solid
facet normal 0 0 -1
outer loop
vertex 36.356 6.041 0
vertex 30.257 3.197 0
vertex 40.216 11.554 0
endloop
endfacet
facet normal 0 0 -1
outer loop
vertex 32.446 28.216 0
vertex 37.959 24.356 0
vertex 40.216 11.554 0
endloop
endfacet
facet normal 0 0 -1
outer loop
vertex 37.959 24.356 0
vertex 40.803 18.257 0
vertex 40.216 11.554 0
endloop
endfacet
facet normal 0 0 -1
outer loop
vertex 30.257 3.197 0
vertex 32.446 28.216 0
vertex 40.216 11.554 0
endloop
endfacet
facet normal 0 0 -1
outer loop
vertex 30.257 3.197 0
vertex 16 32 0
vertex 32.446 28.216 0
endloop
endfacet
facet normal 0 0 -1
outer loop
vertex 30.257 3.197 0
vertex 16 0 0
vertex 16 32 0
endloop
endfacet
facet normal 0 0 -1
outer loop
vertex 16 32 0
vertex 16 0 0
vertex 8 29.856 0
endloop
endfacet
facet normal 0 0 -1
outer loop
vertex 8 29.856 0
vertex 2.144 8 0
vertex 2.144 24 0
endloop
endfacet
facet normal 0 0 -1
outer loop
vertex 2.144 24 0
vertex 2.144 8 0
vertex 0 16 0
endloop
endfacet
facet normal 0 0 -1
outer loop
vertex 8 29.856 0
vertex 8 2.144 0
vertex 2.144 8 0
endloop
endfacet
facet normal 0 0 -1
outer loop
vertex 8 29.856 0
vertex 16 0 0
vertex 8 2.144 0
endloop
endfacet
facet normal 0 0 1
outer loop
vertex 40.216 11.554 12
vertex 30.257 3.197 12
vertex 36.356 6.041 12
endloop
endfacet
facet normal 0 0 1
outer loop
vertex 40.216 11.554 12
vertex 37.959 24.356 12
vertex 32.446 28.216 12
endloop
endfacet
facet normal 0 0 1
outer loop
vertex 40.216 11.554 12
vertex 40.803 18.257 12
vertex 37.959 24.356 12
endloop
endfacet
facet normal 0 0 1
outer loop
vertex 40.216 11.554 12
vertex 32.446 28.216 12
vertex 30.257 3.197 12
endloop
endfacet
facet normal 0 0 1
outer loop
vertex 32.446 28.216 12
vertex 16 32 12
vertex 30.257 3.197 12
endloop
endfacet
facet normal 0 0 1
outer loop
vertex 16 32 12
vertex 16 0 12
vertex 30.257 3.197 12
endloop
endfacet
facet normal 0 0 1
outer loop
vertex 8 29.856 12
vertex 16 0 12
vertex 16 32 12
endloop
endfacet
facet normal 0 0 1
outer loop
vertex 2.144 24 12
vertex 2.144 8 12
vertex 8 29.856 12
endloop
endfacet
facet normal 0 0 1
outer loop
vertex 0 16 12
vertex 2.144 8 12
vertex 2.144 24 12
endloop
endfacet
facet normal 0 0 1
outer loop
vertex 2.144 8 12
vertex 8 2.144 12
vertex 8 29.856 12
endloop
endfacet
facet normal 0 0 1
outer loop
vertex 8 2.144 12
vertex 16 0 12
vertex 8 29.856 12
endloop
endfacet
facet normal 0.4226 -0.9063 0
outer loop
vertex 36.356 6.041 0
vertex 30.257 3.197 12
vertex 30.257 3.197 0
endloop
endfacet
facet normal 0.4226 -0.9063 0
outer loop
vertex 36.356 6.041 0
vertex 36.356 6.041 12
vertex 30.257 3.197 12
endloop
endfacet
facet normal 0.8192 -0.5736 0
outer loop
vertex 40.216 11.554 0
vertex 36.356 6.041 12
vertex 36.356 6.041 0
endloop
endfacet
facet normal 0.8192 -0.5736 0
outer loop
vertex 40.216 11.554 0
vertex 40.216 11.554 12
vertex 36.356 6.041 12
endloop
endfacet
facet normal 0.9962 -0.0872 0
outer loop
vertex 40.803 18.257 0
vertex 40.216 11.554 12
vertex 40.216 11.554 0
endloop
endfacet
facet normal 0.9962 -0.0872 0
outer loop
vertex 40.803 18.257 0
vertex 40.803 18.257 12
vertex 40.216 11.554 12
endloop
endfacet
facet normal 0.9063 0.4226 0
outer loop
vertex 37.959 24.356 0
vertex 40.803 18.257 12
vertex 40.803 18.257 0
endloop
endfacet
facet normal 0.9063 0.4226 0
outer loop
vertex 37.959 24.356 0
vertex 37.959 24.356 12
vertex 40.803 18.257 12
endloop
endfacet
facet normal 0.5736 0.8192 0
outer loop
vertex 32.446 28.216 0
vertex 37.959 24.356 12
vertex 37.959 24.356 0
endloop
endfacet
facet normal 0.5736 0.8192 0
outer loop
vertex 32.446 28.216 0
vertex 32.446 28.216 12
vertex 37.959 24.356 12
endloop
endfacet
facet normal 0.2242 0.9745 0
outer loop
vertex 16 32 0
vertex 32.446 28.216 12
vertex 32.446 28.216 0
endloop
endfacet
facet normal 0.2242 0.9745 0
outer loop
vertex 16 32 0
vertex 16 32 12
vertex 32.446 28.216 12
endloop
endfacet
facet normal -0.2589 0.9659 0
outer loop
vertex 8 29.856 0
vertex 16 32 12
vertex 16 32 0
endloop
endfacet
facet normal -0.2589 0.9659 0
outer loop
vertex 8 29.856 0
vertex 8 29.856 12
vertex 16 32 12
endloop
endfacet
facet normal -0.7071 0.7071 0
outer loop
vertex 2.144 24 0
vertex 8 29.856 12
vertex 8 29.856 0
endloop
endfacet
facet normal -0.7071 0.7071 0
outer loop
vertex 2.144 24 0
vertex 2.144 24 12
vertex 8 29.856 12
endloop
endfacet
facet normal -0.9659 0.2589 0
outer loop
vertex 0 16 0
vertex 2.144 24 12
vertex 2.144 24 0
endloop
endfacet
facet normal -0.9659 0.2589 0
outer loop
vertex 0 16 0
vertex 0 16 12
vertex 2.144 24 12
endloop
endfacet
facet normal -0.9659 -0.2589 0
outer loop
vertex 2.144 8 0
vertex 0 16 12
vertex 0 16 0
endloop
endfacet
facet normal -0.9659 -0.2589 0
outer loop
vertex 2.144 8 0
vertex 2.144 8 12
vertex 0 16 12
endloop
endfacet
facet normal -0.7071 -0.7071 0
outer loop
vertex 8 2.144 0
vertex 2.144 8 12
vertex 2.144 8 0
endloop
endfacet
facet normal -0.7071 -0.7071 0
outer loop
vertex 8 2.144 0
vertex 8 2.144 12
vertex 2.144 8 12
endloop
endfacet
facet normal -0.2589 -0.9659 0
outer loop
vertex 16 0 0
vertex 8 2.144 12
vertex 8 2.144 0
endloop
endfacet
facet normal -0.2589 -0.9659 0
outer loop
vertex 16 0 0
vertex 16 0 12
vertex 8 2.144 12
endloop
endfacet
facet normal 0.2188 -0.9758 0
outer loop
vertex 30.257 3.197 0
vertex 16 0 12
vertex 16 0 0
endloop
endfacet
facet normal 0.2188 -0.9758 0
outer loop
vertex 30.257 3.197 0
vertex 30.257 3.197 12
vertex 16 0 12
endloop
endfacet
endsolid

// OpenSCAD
$fn = 32;

// ----------------------------------------------------------------------
// Eccentric disc: step, 12 mm thick
// ----------------------------------------------------------------------

// --- parameters (mm) ---
profile_height = 12;      // extrusion height
profile_points = 13;      // points of the closed outline

profile = [[0, 16], [2.144, 8], [8, 2.144], [16, 0], [30.257, 3.197], [36.356, 6.041], [40.216, 11.554], [40.803, 18.257], [37.959, 24.356], [32.446, 28.216], [16, 32], [8, 29.856], [2.144, 24]];  // single closed polygon, 13 points, counter clockwise

// --- the one profile operation ---
linear_extrude(height = profile_height) polygon(points = profile);
